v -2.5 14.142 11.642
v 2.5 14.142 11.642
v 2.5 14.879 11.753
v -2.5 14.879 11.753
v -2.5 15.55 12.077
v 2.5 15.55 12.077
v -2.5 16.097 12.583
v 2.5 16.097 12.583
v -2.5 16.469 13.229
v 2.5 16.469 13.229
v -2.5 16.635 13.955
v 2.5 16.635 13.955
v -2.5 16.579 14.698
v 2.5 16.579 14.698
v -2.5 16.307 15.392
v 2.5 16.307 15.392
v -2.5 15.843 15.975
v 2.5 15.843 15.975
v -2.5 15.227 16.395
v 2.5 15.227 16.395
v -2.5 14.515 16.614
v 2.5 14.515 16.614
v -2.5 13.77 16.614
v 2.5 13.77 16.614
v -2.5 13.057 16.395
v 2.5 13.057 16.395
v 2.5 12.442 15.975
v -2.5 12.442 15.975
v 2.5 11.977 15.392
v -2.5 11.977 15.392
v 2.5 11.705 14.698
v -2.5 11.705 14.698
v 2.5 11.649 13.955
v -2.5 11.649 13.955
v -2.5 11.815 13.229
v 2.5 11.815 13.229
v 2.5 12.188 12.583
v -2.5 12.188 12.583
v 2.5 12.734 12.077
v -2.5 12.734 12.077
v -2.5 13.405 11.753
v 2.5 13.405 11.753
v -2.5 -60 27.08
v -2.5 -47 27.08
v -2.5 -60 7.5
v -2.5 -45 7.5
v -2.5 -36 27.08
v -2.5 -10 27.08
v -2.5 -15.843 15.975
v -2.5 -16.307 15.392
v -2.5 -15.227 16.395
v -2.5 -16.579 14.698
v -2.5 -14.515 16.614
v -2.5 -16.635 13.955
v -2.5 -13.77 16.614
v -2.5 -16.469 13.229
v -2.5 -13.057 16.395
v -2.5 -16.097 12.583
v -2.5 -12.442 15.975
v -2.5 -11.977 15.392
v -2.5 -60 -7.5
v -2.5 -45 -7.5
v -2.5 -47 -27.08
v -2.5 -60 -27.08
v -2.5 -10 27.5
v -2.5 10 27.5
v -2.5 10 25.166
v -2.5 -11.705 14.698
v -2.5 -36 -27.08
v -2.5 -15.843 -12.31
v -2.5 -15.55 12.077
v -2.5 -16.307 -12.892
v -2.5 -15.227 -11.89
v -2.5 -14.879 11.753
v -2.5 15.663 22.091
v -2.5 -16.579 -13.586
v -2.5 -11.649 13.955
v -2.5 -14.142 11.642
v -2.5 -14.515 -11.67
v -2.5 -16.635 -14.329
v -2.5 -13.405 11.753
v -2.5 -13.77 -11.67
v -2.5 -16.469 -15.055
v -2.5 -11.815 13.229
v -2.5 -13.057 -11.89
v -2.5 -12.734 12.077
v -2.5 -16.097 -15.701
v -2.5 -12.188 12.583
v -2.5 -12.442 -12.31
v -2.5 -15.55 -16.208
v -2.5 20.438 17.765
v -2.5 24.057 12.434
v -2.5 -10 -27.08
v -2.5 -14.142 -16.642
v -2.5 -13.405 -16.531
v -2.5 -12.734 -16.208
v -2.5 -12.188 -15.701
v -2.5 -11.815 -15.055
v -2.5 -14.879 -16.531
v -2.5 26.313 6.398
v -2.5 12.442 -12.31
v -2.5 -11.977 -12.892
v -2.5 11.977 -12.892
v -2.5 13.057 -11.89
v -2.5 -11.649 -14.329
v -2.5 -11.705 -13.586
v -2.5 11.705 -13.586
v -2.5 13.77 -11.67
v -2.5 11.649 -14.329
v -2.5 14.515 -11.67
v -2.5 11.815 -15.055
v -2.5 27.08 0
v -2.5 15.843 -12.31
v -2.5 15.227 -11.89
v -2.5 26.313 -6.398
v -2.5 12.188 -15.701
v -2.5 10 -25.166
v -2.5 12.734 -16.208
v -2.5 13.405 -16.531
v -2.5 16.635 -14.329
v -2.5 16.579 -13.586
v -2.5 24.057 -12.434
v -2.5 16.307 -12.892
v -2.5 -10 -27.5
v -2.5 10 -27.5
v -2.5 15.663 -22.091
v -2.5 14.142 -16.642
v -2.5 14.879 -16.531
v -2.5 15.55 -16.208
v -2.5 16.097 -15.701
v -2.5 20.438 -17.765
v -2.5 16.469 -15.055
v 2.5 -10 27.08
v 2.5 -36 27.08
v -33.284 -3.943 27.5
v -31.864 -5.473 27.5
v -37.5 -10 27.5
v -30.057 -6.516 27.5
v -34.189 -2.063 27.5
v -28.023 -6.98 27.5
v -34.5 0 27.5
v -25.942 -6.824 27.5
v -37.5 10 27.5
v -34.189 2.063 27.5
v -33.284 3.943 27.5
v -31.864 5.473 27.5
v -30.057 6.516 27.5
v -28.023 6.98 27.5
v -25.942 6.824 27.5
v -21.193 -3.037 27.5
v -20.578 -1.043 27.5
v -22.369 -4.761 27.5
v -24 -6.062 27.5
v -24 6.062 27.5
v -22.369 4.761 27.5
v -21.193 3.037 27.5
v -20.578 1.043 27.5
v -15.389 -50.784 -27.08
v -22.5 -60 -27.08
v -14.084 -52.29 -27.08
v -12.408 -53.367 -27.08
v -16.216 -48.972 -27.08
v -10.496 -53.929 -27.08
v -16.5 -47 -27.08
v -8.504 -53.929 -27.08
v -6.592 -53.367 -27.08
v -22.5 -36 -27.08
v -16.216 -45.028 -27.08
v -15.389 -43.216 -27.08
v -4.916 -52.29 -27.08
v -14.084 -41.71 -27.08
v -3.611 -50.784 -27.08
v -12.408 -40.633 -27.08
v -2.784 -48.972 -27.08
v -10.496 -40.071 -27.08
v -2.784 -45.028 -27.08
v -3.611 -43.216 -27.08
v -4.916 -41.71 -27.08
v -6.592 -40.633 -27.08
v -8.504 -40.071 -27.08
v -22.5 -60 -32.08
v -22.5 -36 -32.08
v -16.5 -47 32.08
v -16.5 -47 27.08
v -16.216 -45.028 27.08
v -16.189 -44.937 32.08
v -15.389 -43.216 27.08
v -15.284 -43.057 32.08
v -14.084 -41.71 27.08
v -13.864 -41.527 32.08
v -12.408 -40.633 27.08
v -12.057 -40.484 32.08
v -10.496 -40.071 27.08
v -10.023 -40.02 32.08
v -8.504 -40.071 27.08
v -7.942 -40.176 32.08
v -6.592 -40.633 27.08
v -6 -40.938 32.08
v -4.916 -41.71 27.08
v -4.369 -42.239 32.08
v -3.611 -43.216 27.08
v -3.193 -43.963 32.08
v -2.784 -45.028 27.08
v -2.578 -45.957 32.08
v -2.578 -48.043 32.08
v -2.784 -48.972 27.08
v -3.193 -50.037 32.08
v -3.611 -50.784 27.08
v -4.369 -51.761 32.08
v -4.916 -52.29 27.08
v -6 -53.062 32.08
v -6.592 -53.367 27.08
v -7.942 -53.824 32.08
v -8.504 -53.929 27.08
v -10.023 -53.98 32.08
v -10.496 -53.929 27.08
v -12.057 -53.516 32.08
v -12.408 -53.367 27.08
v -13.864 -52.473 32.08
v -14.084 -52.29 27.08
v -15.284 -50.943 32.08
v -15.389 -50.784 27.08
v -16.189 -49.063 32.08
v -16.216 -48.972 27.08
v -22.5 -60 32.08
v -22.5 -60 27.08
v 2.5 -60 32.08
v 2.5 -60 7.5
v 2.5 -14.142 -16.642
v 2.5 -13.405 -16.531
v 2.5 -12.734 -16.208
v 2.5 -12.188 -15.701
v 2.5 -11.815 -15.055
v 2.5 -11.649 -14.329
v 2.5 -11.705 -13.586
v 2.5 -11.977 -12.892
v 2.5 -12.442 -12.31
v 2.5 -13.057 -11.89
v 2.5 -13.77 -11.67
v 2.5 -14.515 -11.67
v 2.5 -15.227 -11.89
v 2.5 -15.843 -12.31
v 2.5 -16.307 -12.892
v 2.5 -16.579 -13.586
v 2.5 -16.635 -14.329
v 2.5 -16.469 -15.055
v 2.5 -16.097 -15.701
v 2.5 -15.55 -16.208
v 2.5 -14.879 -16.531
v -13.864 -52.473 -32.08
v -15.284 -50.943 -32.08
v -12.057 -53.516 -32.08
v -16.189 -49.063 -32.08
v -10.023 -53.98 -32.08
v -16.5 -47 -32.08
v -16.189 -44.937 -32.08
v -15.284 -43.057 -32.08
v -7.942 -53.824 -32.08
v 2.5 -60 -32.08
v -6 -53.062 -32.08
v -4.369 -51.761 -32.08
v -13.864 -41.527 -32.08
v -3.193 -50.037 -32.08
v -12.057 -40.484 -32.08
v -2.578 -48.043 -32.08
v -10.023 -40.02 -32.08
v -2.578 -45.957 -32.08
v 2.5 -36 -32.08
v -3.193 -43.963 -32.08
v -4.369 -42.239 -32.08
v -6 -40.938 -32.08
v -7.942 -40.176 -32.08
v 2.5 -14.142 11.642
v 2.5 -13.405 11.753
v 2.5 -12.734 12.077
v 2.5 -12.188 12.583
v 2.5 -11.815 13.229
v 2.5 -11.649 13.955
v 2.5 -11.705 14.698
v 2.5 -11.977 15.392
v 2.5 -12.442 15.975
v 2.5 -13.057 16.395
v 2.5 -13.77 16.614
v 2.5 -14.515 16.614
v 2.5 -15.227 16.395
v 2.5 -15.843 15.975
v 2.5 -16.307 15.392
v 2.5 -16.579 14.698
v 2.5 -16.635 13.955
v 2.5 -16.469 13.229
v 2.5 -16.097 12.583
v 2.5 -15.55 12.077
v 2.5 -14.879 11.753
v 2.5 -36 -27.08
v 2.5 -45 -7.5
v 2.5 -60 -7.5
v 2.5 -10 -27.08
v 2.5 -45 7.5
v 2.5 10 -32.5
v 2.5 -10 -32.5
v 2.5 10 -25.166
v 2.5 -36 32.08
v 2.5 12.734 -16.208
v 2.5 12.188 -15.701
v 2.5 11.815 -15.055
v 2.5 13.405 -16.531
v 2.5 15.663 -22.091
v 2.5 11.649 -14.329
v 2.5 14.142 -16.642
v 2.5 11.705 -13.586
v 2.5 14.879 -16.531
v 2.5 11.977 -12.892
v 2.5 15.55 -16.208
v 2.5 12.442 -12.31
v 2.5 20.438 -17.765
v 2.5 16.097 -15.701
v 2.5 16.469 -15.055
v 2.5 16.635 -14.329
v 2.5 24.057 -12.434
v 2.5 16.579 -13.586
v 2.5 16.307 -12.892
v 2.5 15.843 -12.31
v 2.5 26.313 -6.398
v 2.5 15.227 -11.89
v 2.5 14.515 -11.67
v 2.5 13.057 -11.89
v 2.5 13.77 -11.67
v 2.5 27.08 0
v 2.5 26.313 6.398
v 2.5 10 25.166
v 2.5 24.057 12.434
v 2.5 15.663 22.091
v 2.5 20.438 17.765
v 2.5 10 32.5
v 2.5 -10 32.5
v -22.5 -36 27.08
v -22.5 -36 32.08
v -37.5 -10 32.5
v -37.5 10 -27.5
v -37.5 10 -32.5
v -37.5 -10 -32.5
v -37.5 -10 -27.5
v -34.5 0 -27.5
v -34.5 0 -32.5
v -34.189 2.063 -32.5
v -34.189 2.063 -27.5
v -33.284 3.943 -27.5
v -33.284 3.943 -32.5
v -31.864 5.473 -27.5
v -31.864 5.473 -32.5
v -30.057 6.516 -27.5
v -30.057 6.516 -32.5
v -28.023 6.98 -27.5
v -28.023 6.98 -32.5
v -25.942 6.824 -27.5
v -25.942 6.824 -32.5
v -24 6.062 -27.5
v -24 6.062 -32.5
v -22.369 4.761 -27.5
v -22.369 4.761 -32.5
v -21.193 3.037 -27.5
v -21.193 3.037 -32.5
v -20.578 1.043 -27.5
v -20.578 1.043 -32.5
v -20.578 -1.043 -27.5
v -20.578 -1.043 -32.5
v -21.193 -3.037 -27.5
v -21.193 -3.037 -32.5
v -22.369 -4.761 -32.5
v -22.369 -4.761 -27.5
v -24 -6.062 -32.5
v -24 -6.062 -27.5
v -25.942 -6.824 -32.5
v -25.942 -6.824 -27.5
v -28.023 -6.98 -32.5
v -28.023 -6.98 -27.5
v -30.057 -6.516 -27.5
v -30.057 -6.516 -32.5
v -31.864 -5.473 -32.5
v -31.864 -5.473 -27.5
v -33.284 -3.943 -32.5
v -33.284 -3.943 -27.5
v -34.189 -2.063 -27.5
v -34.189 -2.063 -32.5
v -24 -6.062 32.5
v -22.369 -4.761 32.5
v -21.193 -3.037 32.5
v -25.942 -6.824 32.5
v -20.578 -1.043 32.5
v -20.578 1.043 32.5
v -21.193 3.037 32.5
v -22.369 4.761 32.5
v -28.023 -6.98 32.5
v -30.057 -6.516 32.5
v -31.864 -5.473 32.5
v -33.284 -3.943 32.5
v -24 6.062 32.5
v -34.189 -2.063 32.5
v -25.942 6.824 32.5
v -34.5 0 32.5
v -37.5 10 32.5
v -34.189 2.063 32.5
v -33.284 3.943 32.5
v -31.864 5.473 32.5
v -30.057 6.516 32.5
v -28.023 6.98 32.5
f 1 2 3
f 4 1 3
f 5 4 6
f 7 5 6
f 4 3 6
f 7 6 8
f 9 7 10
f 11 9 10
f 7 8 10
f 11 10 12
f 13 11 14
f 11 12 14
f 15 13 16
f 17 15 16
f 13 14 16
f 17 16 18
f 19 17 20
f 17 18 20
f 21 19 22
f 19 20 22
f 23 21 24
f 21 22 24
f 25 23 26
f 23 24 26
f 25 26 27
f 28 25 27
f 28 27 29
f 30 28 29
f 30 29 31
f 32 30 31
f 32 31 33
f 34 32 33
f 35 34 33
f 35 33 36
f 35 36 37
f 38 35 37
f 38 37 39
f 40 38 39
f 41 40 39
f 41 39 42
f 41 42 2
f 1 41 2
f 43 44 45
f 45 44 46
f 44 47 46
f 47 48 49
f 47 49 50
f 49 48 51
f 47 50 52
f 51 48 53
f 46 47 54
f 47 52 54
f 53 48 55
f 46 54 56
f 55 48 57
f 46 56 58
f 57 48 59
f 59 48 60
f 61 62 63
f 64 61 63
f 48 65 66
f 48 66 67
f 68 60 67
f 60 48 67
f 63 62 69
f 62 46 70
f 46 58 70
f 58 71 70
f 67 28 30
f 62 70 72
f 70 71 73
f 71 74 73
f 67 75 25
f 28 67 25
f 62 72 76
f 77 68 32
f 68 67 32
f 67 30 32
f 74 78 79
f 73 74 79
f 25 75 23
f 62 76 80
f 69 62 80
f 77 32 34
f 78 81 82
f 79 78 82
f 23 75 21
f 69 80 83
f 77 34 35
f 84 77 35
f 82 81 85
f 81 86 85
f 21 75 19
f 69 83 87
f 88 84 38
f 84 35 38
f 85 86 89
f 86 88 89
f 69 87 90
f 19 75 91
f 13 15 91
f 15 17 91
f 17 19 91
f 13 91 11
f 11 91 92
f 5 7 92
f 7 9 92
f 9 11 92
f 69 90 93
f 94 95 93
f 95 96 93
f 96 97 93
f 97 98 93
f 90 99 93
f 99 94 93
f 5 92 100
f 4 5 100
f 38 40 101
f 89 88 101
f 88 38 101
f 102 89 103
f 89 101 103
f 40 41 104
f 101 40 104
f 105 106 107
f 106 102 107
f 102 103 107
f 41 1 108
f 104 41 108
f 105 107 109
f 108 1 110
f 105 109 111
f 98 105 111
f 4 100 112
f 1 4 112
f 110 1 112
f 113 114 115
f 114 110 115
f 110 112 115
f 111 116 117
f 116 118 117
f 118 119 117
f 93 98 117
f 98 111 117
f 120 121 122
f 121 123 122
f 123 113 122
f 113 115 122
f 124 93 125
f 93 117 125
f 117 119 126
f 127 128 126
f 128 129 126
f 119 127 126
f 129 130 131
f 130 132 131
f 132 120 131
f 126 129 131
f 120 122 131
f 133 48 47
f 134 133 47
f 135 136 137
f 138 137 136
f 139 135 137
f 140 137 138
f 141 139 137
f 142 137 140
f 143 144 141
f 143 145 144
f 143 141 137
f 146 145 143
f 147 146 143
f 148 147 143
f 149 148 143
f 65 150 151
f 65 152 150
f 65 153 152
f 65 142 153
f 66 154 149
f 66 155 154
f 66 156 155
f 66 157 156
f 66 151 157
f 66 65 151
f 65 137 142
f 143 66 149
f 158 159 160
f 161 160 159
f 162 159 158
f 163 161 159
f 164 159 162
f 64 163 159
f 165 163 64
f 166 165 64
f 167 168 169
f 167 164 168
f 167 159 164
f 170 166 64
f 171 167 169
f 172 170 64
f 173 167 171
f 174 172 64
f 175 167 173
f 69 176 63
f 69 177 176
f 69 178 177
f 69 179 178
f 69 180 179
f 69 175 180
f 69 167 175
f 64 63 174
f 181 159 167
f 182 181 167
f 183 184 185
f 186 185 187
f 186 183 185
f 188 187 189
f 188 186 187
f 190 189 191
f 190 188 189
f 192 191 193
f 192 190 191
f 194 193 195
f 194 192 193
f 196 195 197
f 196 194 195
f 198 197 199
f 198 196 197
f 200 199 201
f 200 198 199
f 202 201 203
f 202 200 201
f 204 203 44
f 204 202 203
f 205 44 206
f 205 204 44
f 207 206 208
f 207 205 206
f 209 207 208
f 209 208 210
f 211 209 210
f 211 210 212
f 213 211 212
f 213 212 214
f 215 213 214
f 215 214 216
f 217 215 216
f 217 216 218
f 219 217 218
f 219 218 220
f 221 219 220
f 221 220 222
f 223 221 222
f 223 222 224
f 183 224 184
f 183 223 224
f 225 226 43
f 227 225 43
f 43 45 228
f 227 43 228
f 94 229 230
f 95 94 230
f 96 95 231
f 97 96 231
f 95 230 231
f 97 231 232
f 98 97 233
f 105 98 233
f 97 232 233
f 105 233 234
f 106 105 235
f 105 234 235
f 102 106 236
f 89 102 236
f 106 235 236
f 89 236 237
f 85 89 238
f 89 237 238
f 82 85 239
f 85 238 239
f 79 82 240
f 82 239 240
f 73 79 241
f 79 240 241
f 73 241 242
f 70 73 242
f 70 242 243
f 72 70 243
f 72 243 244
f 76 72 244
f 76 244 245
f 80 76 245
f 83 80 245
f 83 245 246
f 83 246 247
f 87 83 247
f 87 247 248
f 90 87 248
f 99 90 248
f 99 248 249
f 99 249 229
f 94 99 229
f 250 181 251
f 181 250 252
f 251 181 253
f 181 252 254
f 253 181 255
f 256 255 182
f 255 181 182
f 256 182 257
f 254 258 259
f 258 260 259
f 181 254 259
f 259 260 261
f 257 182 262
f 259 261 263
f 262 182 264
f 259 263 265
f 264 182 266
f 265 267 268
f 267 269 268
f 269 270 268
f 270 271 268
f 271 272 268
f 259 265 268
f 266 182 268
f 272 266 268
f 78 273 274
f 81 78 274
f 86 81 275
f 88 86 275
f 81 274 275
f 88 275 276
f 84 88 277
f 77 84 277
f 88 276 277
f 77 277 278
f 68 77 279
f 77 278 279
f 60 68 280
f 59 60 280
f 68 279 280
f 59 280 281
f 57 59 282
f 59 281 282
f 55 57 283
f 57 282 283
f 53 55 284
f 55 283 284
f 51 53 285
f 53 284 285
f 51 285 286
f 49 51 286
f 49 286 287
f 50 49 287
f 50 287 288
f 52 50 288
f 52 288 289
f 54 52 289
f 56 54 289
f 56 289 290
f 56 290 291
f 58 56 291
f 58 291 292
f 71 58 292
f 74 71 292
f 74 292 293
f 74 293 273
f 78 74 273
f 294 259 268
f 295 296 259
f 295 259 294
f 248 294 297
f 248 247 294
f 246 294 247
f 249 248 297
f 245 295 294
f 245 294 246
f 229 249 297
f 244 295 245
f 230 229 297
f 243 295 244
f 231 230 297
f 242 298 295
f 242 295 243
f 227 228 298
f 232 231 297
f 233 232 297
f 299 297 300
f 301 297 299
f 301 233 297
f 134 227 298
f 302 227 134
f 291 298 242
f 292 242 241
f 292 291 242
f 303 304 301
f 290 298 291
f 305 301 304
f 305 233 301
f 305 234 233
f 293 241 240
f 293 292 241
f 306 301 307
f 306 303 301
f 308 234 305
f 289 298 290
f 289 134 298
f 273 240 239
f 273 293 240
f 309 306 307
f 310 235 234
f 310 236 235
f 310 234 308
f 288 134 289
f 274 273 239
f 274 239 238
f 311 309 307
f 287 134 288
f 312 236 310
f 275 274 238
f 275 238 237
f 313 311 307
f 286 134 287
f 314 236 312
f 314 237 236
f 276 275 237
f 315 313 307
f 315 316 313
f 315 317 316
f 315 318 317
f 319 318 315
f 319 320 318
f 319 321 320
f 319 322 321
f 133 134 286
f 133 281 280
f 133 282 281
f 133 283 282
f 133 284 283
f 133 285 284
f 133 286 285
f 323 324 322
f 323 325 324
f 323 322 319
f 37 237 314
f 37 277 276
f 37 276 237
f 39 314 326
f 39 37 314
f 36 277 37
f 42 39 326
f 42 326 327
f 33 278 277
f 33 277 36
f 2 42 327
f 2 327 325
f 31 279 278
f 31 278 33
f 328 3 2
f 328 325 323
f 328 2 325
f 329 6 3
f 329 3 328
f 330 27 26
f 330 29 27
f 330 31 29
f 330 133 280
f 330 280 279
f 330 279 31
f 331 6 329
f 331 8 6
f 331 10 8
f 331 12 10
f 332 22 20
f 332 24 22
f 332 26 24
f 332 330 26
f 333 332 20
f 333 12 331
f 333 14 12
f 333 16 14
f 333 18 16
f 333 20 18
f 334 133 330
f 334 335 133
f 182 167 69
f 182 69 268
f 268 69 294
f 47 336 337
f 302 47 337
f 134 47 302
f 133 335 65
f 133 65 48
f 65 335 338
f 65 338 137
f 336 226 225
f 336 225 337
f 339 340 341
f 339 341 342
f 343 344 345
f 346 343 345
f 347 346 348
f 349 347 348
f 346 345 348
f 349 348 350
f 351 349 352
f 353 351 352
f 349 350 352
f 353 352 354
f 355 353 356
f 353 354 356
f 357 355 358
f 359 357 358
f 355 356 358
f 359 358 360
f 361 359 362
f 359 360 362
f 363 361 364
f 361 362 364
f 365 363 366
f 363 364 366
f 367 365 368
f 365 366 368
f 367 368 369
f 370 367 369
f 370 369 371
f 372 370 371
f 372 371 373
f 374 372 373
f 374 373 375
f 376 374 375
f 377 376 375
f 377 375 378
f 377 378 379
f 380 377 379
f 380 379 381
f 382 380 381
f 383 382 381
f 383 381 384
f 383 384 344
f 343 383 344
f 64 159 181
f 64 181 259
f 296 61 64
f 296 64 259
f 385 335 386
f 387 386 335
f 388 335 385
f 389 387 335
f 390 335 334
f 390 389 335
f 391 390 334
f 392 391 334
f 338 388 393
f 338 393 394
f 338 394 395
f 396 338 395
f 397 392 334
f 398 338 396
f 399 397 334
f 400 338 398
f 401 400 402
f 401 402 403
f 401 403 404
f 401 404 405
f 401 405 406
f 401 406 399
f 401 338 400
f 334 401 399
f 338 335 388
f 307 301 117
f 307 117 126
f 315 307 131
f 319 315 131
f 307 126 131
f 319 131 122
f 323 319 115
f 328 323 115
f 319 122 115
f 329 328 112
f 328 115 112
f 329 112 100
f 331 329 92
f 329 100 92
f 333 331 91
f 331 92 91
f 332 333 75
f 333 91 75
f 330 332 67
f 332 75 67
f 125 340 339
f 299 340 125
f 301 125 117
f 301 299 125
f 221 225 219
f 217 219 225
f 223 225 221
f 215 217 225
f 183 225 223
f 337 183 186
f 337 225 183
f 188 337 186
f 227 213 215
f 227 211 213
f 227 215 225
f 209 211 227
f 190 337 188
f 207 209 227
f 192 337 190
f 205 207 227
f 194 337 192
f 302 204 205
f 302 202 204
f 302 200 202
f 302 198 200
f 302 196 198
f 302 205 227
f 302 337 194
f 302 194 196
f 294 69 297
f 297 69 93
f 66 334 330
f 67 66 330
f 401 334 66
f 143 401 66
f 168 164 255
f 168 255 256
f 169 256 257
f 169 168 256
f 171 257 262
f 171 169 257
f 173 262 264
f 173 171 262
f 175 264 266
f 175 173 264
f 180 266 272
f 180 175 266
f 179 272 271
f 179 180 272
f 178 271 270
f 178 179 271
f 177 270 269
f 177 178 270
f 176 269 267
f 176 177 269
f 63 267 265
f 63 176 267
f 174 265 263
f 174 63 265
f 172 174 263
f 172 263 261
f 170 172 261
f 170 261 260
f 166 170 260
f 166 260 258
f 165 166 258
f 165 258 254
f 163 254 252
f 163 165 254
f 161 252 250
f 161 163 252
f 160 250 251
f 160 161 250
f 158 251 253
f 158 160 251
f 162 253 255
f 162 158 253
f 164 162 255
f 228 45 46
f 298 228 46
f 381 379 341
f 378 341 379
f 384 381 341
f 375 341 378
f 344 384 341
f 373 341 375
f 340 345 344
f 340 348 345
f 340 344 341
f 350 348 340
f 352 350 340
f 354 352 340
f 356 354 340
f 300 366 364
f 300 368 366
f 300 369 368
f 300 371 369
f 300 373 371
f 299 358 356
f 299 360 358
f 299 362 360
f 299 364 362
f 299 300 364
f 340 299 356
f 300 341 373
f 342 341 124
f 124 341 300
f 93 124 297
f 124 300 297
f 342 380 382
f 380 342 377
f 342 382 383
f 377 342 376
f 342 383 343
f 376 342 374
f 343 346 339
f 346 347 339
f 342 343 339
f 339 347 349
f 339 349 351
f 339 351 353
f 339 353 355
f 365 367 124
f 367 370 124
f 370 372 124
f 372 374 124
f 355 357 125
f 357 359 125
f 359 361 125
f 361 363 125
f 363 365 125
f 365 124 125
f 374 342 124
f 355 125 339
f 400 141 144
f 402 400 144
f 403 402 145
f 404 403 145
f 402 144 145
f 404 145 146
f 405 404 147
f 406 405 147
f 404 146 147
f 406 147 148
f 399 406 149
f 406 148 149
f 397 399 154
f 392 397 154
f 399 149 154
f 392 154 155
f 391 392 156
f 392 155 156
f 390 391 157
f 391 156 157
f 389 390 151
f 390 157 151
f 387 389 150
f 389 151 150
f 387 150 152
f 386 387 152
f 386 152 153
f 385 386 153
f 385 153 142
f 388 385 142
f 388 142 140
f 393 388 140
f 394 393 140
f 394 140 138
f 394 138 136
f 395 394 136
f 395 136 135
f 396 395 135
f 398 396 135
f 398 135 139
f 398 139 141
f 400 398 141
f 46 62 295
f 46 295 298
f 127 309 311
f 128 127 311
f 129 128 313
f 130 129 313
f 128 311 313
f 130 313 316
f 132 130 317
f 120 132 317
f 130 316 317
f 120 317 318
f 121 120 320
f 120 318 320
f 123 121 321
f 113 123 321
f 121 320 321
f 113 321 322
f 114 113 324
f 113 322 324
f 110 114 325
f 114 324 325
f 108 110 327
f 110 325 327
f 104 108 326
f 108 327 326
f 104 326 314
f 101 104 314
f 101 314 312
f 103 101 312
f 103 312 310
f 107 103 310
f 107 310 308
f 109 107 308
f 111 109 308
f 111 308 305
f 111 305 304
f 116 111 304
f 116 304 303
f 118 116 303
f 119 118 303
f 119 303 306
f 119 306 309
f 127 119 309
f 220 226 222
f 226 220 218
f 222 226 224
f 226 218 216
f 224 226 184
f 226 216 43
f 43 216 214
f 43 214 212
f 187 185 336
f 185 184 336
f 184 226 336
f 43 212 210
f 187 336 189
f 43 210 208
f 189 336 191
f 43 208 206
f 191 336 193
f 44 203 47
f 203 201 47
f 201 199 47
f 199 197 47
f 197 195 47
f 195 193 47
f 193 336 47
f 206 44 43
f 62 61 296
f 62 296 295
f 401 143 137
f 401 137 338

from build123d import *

# Parameters (mm, degrees)
BOSS_EXTRUDE1_DEPTH      = 2.5
BOSS_EXTRUDE1_DEPTH_BACK = 2.5
SKETCH2_R                = 2.5
CUT_EXTRUDE1_DEPTH       = 67.01762189
BOSS_EXTRUDE2_DEPTH      = 2.5
BOSS_EXTRUDE2_DEPTH_BACK = 2.5
SKETCH3_W                = 65
SKETCH3_H                = 20
SKETCH5_W                = 5
SKETCH5_H                = 20
BOSS_EXTRUDE4_DEPTH      = 35
SKETCH6_R                = 7
CUT_EXTRUDE2_DEPTH       = 97.079394253
SKETCH7_W                = 15
SKETCH7_H                = 15
CUT_EXTRUDE3_DEPTH       = 77.689308251
SKETCH8_W                = 25
SKETCH8_H                = 24
BOSS_EXTRUDE5_DEPTH      = 5
CUT_EXTRUDE4_DEPTH       = 93.498791343
CUT_EXTRUDE4_DEPTH_BACK  = 93.498791343
SKETCH9_R                = 7


with BuildPart() as part:
    # Sketch1 → Boss-Extrude1 (new, two sides: drawn at the far end of the back side and taken through both)
    with BuildSketch(Plane(origin=(0, 0, 0), x_dir=(0, 0, -1), z_dir=(1, 0, 0)).offset(-BOSS_EXTRUDE1_DEPTH_BACK)):
        with BuildLine():
            Line((-27.08, 0), (-27.08, -60))
            Line((-27.08, -60), (27.08, -60))
            Line((27.08, -60), (27.08, 0))
            ThreePointArc((27.08, 0), (0, 27.08), (-27.08, 0))
        make_face()
    extrude(amount=BOSS_EXTRUDE1_DEPTH + BOSS_EXTRUDE1_DEPTH_BACK)

    # Sketch2 → Cut-Extrude1 (cut, through all)
    with BuildSketch(Plane(origin=(2.5, 0, 0), x_dir=(0, 0, -1), z_dir=(1, 0, 0))):
        with Locations((-14.142135624, 14.142135624)):
            Circle(SKETCH2_R)
        with Locations((14.142135624, 14.142135624)):
            Circle(SKETCH2_R)
        with Locations((14.142135624, -14.142135624)):
            Circle(SKETCH2_R)
        with Locations((-14.142135624, -14.142135624)):
            Circle(SKETCH2_R)
    extrude(amount=-CUT_EXTRUDE1_DEPTH, mode=Mode.SUBTRACT)

    # Sketch3 → Boss-Extrude2 (add, two sides: drawn at the far end of the back side and taken through both)
    with BuildSketch(Plane(origin=(0, 0, 0), x_dir=(0, 0, -1), z_dir=(1, 0, 0)).offset(-BOSS_EXTRUDE2_DEPTH_BACK)):
        Rectangle(SKETCH3_W, SKETCH3_H)
    extrude(amount=BOSS_EXTRUDE2_DEPTH + BOSS_EXTRUDE2_DEPTH_BACK)

    # Sketch5 → Boss-Extrude4 (add)
    with BuildSketch(Plane.ZY.offset(2.5)):
        with Locations((-30, 0)):
            Rectangle(SKETCH5_W, SKETCH5_H)
        with Locations((30, 0)):
            Rectangle(SKETCH5_W, SKETCH5_H)
    extrude(amount=BOSS_EXTRUDE4_DEPTH)

    # Sketch6 → Cut-Extrude2 (cut, through all)
    with BuildSketch(Plane(origin=(0, 0, -32.5), x_dir=(-1, 0, 0), z_dir=(0, 0, -1))):
        with Locations((27.5, 0)):
            Circle(SKETCH6_R)
    extrude(amount=-CUT_EXTRUDE2_DEPTH, mode=Mode.SUBTRACT)

    # Sketch7 → Cut-Extrude3 (cut, through all)
    with BuildSketch(Plane.ZY.offset(2.5)):
        with Locations((0, -52.5)):
            Rectangle(SKETCH7_W, SKETCH7_H)
    extrude(amount=-CUT_EXTRUDE3_DEPTH, mode=Mode.SUBTRACT)

    # Sketch8 → Boss-Extrude5 (add)
    with BuildSketch(Plane.XY.offset(27.08)):
        with Locations((-10, -48)):
            Rectangle(SKETCH8_W, SKETCH8_H)
    boss_extrude5 = extrude(amount=BOSS_EXTRUDE5_DEPTH)

    # Mirror1: Boss-Extrude5 across plane
    add(boss_extrude5.mirror(Plane.XY))

    # Sketch9 → Cut-Extrude4 (cut, two sides: drawn at the far end of the back side and taken through both)
    with BuildSketch(Plane(origin=(0, 0, 27.08), x_dir=(-1, 0, 0), z_dir=(0, 0, -1)).offset(-CUT_EXTRUDE4_DEPTH_BACK)):
        with Locations((9.5, -47)):
            Circle(SKETCH9_R)
    extrude(amount=CUT_EXTRUDE4_DEPTH + CUT_EXTRUDE4_DEPTH_BACK, mode=Mode.SUBTRACT)


solid = part.part
